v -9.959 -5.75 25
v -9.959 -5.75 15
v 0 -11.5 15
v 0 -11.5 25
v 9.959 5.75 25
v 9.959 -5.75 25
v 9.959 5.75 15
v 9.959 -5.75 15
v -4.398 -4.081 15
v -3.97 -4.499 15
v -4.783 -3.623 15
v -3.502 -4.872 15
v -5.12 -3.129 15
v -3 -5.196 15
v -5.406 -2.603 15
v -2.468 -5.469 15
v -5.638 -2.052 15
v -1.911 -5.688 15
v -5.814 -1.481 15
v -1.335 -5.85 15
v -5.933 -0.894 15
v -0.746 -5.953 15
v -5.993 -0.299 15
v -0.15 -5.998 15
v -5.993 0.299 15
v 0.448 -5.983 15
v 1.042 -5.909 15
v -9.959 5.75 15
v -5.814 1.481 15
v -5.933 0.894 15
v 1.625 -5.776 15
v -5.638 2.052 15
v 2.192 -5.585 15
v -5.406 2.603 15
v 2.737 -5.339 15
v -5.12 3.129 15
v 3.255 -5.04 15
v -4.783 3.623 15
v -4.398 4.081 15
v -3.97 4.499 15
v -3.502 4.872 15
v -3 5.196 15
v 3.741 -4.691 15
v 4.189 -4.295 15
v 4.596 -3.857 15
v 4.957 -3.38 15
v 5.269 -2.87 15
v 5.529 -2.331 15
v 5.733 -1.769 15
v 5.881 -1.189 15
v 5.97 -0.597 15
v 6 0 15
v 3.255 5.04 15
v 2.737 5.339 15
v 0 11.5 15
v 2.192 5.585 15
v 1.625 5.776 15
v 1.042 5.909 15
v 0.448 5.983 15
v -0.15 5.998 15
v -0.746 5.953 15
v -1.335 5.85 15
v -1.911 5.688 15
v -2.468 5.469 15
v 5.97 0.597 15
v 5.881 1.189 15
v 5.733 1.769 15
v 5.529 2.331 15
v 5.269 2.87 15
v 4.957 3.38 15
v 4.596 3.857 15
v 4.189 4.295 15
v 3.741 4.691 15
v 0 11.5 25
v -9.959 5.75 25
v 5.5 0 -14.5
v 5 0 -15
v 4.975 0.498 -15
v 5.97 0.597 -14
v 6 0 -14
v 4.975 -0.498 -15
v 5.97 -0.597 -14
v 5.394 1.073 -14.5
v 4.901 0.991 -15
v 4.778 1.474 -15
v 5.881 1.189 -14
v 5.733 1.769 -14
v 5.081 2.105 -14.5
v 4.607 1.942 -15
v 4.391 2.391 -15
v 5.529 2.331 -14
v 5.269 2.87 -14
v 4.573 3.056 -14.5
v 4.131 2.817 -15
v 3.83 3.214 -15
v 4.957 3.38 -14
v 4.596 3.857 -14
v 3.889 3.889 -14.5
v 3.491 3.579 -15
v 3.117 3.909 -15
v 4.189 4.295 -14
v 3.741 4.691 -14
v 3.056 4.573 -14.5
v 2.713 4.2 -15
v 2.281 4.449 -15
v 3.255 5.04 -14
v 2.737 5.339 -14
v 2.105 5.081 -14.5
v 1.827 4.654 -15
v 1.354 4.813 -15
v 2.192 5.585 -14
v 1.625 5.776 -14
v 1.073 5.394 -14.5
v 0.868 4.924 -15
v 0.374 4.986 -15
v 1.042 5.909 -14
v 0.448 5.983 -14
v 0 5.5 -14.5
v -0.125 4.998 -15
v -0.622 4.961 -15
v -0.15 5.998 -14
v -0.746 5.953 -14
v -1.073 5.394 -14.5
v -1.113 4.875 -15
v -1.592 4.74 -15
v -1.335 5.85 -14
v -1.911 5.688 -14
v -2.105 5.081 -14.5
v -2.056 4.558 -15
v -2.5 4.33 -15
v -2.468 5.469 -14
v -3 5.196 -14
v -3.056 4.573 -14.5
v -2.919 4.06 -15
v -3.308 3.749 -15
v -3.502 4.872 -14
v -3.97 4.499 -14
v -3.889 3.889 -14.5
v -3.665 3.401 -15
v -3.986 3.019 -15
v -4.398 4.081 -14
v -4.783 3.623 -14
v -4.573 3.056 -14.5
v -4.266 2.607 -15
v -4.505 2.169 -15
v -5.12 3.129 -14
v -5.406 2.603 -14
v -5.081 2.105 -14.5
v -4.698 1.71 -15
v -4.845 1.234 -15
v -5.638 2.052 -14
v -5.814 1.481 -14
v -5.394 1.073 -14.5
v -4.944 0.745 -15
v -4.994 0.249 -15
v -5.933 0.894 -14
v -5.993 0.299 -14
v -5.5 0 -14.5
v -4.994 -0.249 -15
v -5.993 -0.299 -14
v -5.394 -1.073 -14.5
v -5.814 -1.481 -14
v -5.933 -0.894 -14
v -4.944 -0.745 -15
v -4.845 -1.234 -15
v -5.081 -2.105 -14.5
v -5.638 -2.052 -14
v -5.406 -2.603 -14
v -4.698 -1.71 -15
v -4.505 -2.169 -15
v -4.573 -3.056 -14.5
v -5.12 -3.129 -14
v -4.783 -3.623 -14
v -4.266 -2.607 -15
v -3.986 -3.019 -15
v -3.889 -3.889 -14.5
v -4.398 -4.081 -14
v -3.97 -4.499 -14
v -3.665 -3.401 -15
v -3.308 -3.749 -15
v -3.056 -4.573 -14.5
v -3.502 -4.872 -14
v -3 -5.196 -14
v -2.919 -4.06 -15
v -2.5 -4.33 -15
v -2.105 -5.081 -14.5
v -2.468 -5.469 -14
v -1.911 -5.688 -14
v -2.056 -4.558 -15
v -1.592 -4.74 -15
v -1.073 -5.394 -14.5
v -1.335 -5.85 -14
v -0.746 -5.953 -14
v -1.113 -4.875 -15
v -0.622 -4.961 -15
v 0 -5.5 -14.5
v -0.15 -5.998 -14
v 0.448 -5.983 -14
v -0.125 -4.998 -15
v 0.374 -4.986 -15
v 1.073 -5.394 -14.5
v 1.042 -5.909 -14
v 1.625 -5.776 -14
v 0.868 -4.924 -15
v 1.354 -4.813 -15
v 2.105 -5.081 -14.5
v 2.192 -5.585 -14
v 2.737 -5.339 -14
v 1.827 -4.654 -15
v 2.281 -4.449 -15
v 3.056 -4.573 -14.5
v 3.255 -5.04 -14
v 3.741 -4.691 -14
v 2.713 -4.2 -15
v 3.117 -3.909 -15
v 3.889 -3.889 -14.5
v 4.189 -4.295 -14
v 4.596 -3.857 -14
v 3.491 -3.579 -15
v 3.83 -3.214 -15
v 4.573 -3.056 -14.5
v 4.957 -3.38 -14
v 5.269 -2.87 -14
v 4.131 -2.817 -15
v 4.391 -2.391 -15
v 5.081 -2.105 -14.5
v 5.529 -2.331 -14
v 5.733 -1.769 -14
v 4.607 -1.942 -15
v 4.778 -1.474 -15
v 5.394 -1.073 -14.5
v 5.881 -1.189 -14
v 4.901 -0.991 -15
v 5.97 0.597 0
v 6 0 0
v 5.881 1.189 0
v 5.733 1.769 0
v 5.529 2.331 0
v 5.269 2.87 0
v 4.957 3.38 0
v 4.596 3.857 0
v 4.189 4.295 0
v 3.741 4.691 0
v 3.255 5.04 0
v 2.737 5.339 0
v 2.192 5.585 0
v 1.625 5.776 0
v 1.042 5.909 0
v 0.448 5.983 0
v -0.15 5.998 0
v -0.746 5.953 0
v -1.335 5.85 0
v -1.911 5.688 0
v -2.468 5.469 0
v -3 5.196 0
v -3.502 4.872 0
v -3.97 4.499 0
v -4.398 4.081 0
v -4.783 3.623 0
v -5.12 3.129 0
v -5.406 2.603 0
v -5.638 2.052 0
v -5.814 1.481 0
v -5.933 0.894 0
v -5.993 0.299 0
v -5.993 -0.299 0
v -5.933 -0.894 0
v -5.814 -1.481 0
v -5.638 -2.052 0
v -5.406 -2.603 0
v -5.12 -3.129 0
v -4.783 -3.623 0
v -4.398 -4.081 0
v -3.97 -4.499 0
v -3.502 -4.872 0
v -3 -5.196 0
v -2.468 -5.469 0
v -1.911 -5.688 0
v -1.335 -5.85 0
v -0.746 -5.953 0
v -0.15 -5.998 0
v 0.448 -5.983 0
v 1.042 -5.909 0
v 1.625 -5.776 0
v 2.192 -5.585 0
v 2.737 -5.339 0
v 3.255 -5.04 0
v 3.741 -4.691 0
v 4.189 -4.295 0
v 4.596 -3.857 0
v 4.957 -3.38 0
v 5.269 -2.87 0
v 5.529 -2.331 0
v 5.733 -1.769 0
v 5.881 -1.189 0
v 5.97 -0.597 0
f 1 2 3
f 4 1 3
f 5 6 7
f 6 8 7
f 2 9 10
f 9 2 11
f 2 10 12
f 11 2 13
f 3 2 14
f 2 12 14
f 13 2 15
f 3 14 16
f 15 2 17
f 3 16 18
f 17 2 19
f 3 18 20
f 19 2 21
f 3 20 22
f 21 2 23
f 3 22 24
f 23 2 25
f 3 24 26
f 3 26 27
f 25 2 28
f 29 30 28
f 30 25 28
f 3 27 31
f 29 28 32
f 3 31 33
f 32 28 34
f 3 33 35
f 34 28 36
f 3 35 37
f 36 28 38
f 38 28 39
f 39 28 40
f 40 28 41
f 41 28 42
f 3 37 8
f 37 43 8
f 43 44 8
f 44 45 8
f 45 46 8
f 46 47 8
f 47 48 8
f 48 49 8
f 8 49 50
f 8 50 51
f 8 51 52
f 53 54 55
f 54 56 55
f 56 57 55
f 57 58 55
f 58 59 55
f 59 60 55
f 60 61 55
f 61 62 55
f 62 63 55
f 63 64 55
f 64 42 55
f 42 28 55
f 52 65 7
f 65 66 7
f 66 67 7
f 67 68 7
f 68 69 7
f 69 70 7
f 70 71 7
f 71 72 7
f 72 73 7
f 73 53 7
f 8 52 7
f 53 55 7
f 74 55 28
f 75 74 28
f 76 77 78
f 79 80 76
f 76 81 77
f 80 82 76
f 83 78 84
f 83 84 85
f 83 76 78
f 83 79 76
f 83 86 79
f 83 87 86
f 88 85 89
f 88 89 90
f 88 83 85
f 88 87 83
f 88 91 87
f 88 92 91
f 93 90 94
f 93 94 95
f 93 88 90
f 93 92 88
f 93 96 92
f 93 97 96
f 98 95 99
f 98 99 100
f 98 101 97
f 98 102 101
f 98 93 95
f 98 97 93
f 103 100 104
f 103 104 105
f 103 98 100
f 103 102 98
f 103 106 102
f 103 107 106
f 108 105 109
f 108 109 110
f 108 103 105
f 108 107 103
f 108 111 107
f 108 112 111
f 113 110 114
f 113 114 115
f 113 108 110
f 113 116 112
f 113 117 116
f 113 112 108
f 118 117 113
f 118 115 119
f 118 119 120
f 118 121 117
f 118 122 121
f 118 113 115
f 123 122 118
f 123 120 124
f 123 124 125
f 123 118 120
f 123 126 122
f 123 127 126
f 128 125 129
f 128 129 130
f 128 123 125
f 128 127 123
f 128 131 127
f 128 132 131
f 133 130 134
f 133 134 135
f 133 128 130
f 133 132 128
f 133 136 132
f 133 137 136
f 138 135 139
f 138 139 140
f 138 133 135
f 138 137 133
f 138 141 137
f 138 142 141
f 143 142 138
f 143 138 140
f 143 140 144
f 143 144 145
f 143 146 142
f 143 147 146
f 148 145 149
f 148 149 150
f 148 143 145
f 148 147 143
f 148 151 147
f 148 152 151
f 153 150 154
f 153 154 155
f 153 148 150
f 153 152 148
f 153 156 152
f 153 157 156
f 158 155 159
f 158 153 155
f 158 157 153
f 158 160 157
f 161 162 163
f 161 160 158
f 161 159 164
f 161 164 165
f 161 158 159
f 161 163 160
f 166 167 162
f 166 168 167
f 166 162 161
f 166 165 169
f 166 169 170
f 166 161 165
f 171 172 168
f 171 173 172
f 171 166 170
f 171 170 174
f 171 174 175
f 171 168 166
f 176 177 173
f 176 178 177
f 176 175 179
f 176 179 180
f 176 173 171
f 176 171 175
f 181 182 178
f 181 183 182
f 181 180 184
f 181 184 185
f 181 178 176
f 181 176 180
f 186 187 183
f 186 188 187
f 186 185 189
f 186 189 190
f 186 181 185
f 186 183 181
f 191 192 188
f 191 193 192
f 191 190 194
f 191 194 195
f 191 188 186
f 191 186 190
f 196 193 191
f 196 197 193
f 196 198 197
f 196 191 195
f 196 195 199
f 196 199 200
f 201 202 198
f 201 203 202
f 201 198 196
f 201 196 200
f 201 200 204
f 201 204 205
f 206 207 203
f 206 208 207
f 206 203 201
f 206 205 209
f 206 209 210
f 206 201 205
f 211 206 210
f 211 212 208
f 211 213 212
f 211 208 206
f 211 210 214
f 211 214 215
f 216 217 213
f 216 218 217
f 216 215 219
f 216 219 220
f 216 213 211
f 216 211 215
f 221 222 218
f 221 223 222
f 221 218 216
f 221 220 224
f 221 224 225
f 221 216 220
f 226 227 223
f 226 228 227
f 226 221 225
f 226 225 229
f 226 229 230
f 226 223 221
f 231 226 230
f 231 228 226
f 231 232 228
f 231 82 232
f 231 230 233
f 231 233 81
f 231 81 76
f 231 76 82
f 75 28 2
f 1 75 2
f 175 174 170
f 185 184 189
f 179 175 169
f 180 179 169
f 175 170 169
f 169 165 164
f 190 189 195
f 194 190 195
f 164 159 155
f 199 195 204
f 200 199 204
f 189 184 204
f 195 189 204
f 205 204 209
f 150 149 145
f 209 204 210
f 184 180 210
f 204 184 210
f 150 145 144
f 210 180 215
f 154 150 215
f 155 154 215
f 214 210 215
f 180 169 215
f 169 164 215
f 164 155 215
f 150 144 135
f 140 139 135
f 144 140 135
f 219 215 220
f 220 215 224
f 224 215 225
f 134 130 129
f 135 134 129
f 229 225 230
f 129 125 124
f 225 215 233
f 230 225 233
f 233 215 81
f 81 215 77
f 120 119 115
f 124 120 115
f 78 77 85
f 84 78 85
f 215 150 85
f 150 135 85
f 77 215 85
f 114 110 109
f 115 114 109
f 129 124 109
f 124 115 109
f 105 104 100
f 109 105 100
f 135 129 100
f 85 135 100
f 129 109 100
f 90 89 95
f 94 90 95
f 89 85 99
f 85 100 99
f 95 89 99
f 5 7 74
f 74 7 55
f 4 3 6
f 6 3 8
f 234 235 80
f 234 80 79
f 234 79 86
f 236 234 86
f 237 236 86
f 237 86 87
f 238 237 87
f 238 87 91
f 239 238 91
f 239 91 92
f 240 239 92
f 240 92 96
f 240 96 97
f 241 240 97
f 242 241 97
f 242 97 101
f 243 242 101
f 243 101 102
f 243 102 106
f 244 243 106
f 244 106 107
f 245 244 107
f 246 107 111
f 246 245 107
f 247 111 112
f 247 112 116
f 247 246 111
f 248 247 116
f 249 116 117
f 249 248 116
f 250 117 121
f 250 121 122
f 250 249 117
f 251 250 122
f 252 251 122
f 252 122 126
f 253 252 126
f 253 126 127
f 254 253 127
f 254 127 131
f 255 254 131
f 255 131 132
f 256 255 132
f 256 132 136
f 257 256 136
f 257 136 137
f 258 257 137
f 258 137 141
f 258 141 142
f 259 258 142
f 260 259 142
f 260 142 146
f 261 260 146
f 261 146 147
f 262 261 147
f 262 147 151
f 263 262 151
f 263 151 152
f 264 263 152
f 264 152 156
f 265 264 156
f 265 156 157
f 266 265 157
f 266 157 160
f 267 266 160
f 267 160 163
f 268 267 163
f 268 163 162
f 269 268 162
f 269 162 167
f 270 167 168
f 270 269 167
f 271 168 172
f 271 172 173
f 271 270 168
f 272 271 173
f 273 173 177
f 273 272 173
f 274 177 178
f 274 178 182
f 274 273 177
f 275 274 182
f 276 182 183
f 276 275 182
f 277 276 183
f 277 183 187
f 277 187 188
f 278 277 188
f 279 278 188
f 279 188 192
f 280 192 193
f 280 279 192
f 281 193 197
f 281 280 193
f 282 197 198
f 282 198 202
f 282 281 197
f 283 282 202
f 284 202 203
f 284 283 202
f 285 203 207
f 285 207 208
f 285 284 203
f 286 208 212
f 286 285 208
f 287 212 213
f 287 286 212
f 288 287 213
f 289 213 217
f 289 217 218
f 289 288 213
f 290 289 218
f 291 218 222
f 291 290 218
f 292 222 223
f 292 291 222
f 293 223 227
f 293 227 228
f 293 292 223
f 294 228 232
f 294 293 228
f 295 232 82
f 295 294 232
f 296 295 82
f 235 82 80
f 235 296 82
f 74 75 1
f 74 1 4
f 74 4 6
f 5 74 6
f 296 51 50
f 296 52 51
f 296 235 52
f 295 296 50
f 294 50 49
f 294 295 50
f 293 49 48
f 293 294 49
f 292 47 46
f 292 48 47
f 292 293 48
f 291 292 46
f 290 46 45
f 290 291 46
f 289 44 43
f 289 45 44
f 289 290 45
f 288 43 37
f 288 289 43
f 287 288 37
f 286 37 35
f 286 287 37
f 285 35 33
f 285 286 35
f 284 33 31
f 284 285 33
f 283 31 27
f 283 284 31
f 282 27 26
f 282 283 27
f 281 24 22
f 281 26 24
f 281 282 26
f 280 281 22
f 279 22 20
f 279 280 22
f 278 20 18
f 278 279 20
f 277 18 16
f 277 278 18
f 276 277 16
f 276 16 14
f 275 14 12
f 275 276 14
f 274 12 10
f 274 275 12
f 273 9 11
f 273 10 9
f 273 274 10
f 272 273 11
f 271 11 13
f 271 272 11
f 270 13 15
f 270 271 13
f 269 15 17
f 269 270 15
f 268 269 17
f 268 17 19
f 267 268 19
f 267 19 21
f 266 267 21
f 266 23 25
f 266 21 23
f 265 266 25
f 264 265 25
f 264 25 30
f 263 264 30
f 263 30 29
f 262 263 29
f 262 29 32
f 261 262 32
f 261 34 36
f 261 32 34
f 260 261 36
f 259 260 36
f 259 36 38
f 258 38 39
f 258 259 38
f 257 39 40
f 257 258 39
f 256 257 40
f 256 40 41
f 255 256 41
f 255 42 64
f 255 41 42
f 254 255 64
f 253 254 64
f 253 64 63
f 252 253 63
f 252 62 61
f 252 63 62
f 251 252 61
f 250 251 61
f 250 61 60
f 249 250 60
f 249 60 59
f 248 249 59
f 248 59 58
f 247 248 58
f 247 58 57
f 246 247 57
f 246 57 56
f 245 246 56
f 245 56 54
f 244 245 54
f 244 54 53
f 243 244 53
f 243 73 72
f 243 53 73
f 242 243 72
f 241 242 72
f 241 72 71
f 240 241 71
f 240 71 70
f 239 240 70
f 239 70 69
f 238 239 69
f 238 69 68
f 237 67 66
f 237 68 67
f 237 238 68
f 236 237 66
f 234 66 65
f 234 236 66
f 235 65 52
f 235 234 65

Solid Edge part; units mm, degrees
sketch "Sketch1" plane through (0, 0, 0) normal (0, 0, 1) x (1, 0, 0)
  circle A0 centre (0, 0) radius 6
  dimension "D1" = 12
extrude "Protrusion1" add sketch "Sketch1" along normal mid plane 30
sketch "Sketch2" plane through (0, 0, 15) normal (0, 0, 1) x (1, 0, 0)
  line L0 (-9.9593, 5.75) -> (-9.9593, -5.75)
  line L1 (-9.9593, -5.75) -> (0, -11.5)
  line L2 (0, -11.5) -> (9.9593, -5.75)
  line L3 (9.9593, -5.75) -> (9.9593, 5.75)
  line L4 (9.9593, 5.75) -> (0, 11.5)
  line L5 (0, 11.5) -> (-9.9593, 5.75)
  dimension "D1" = 23
extrude "Protrusion2" add sketch "Sketch2" along normal blind 10
chamfer "Chamfer1" distance 1 angle 45 1 edges at (-6, 0, -15)
properties material "알루미늄, 1060"
